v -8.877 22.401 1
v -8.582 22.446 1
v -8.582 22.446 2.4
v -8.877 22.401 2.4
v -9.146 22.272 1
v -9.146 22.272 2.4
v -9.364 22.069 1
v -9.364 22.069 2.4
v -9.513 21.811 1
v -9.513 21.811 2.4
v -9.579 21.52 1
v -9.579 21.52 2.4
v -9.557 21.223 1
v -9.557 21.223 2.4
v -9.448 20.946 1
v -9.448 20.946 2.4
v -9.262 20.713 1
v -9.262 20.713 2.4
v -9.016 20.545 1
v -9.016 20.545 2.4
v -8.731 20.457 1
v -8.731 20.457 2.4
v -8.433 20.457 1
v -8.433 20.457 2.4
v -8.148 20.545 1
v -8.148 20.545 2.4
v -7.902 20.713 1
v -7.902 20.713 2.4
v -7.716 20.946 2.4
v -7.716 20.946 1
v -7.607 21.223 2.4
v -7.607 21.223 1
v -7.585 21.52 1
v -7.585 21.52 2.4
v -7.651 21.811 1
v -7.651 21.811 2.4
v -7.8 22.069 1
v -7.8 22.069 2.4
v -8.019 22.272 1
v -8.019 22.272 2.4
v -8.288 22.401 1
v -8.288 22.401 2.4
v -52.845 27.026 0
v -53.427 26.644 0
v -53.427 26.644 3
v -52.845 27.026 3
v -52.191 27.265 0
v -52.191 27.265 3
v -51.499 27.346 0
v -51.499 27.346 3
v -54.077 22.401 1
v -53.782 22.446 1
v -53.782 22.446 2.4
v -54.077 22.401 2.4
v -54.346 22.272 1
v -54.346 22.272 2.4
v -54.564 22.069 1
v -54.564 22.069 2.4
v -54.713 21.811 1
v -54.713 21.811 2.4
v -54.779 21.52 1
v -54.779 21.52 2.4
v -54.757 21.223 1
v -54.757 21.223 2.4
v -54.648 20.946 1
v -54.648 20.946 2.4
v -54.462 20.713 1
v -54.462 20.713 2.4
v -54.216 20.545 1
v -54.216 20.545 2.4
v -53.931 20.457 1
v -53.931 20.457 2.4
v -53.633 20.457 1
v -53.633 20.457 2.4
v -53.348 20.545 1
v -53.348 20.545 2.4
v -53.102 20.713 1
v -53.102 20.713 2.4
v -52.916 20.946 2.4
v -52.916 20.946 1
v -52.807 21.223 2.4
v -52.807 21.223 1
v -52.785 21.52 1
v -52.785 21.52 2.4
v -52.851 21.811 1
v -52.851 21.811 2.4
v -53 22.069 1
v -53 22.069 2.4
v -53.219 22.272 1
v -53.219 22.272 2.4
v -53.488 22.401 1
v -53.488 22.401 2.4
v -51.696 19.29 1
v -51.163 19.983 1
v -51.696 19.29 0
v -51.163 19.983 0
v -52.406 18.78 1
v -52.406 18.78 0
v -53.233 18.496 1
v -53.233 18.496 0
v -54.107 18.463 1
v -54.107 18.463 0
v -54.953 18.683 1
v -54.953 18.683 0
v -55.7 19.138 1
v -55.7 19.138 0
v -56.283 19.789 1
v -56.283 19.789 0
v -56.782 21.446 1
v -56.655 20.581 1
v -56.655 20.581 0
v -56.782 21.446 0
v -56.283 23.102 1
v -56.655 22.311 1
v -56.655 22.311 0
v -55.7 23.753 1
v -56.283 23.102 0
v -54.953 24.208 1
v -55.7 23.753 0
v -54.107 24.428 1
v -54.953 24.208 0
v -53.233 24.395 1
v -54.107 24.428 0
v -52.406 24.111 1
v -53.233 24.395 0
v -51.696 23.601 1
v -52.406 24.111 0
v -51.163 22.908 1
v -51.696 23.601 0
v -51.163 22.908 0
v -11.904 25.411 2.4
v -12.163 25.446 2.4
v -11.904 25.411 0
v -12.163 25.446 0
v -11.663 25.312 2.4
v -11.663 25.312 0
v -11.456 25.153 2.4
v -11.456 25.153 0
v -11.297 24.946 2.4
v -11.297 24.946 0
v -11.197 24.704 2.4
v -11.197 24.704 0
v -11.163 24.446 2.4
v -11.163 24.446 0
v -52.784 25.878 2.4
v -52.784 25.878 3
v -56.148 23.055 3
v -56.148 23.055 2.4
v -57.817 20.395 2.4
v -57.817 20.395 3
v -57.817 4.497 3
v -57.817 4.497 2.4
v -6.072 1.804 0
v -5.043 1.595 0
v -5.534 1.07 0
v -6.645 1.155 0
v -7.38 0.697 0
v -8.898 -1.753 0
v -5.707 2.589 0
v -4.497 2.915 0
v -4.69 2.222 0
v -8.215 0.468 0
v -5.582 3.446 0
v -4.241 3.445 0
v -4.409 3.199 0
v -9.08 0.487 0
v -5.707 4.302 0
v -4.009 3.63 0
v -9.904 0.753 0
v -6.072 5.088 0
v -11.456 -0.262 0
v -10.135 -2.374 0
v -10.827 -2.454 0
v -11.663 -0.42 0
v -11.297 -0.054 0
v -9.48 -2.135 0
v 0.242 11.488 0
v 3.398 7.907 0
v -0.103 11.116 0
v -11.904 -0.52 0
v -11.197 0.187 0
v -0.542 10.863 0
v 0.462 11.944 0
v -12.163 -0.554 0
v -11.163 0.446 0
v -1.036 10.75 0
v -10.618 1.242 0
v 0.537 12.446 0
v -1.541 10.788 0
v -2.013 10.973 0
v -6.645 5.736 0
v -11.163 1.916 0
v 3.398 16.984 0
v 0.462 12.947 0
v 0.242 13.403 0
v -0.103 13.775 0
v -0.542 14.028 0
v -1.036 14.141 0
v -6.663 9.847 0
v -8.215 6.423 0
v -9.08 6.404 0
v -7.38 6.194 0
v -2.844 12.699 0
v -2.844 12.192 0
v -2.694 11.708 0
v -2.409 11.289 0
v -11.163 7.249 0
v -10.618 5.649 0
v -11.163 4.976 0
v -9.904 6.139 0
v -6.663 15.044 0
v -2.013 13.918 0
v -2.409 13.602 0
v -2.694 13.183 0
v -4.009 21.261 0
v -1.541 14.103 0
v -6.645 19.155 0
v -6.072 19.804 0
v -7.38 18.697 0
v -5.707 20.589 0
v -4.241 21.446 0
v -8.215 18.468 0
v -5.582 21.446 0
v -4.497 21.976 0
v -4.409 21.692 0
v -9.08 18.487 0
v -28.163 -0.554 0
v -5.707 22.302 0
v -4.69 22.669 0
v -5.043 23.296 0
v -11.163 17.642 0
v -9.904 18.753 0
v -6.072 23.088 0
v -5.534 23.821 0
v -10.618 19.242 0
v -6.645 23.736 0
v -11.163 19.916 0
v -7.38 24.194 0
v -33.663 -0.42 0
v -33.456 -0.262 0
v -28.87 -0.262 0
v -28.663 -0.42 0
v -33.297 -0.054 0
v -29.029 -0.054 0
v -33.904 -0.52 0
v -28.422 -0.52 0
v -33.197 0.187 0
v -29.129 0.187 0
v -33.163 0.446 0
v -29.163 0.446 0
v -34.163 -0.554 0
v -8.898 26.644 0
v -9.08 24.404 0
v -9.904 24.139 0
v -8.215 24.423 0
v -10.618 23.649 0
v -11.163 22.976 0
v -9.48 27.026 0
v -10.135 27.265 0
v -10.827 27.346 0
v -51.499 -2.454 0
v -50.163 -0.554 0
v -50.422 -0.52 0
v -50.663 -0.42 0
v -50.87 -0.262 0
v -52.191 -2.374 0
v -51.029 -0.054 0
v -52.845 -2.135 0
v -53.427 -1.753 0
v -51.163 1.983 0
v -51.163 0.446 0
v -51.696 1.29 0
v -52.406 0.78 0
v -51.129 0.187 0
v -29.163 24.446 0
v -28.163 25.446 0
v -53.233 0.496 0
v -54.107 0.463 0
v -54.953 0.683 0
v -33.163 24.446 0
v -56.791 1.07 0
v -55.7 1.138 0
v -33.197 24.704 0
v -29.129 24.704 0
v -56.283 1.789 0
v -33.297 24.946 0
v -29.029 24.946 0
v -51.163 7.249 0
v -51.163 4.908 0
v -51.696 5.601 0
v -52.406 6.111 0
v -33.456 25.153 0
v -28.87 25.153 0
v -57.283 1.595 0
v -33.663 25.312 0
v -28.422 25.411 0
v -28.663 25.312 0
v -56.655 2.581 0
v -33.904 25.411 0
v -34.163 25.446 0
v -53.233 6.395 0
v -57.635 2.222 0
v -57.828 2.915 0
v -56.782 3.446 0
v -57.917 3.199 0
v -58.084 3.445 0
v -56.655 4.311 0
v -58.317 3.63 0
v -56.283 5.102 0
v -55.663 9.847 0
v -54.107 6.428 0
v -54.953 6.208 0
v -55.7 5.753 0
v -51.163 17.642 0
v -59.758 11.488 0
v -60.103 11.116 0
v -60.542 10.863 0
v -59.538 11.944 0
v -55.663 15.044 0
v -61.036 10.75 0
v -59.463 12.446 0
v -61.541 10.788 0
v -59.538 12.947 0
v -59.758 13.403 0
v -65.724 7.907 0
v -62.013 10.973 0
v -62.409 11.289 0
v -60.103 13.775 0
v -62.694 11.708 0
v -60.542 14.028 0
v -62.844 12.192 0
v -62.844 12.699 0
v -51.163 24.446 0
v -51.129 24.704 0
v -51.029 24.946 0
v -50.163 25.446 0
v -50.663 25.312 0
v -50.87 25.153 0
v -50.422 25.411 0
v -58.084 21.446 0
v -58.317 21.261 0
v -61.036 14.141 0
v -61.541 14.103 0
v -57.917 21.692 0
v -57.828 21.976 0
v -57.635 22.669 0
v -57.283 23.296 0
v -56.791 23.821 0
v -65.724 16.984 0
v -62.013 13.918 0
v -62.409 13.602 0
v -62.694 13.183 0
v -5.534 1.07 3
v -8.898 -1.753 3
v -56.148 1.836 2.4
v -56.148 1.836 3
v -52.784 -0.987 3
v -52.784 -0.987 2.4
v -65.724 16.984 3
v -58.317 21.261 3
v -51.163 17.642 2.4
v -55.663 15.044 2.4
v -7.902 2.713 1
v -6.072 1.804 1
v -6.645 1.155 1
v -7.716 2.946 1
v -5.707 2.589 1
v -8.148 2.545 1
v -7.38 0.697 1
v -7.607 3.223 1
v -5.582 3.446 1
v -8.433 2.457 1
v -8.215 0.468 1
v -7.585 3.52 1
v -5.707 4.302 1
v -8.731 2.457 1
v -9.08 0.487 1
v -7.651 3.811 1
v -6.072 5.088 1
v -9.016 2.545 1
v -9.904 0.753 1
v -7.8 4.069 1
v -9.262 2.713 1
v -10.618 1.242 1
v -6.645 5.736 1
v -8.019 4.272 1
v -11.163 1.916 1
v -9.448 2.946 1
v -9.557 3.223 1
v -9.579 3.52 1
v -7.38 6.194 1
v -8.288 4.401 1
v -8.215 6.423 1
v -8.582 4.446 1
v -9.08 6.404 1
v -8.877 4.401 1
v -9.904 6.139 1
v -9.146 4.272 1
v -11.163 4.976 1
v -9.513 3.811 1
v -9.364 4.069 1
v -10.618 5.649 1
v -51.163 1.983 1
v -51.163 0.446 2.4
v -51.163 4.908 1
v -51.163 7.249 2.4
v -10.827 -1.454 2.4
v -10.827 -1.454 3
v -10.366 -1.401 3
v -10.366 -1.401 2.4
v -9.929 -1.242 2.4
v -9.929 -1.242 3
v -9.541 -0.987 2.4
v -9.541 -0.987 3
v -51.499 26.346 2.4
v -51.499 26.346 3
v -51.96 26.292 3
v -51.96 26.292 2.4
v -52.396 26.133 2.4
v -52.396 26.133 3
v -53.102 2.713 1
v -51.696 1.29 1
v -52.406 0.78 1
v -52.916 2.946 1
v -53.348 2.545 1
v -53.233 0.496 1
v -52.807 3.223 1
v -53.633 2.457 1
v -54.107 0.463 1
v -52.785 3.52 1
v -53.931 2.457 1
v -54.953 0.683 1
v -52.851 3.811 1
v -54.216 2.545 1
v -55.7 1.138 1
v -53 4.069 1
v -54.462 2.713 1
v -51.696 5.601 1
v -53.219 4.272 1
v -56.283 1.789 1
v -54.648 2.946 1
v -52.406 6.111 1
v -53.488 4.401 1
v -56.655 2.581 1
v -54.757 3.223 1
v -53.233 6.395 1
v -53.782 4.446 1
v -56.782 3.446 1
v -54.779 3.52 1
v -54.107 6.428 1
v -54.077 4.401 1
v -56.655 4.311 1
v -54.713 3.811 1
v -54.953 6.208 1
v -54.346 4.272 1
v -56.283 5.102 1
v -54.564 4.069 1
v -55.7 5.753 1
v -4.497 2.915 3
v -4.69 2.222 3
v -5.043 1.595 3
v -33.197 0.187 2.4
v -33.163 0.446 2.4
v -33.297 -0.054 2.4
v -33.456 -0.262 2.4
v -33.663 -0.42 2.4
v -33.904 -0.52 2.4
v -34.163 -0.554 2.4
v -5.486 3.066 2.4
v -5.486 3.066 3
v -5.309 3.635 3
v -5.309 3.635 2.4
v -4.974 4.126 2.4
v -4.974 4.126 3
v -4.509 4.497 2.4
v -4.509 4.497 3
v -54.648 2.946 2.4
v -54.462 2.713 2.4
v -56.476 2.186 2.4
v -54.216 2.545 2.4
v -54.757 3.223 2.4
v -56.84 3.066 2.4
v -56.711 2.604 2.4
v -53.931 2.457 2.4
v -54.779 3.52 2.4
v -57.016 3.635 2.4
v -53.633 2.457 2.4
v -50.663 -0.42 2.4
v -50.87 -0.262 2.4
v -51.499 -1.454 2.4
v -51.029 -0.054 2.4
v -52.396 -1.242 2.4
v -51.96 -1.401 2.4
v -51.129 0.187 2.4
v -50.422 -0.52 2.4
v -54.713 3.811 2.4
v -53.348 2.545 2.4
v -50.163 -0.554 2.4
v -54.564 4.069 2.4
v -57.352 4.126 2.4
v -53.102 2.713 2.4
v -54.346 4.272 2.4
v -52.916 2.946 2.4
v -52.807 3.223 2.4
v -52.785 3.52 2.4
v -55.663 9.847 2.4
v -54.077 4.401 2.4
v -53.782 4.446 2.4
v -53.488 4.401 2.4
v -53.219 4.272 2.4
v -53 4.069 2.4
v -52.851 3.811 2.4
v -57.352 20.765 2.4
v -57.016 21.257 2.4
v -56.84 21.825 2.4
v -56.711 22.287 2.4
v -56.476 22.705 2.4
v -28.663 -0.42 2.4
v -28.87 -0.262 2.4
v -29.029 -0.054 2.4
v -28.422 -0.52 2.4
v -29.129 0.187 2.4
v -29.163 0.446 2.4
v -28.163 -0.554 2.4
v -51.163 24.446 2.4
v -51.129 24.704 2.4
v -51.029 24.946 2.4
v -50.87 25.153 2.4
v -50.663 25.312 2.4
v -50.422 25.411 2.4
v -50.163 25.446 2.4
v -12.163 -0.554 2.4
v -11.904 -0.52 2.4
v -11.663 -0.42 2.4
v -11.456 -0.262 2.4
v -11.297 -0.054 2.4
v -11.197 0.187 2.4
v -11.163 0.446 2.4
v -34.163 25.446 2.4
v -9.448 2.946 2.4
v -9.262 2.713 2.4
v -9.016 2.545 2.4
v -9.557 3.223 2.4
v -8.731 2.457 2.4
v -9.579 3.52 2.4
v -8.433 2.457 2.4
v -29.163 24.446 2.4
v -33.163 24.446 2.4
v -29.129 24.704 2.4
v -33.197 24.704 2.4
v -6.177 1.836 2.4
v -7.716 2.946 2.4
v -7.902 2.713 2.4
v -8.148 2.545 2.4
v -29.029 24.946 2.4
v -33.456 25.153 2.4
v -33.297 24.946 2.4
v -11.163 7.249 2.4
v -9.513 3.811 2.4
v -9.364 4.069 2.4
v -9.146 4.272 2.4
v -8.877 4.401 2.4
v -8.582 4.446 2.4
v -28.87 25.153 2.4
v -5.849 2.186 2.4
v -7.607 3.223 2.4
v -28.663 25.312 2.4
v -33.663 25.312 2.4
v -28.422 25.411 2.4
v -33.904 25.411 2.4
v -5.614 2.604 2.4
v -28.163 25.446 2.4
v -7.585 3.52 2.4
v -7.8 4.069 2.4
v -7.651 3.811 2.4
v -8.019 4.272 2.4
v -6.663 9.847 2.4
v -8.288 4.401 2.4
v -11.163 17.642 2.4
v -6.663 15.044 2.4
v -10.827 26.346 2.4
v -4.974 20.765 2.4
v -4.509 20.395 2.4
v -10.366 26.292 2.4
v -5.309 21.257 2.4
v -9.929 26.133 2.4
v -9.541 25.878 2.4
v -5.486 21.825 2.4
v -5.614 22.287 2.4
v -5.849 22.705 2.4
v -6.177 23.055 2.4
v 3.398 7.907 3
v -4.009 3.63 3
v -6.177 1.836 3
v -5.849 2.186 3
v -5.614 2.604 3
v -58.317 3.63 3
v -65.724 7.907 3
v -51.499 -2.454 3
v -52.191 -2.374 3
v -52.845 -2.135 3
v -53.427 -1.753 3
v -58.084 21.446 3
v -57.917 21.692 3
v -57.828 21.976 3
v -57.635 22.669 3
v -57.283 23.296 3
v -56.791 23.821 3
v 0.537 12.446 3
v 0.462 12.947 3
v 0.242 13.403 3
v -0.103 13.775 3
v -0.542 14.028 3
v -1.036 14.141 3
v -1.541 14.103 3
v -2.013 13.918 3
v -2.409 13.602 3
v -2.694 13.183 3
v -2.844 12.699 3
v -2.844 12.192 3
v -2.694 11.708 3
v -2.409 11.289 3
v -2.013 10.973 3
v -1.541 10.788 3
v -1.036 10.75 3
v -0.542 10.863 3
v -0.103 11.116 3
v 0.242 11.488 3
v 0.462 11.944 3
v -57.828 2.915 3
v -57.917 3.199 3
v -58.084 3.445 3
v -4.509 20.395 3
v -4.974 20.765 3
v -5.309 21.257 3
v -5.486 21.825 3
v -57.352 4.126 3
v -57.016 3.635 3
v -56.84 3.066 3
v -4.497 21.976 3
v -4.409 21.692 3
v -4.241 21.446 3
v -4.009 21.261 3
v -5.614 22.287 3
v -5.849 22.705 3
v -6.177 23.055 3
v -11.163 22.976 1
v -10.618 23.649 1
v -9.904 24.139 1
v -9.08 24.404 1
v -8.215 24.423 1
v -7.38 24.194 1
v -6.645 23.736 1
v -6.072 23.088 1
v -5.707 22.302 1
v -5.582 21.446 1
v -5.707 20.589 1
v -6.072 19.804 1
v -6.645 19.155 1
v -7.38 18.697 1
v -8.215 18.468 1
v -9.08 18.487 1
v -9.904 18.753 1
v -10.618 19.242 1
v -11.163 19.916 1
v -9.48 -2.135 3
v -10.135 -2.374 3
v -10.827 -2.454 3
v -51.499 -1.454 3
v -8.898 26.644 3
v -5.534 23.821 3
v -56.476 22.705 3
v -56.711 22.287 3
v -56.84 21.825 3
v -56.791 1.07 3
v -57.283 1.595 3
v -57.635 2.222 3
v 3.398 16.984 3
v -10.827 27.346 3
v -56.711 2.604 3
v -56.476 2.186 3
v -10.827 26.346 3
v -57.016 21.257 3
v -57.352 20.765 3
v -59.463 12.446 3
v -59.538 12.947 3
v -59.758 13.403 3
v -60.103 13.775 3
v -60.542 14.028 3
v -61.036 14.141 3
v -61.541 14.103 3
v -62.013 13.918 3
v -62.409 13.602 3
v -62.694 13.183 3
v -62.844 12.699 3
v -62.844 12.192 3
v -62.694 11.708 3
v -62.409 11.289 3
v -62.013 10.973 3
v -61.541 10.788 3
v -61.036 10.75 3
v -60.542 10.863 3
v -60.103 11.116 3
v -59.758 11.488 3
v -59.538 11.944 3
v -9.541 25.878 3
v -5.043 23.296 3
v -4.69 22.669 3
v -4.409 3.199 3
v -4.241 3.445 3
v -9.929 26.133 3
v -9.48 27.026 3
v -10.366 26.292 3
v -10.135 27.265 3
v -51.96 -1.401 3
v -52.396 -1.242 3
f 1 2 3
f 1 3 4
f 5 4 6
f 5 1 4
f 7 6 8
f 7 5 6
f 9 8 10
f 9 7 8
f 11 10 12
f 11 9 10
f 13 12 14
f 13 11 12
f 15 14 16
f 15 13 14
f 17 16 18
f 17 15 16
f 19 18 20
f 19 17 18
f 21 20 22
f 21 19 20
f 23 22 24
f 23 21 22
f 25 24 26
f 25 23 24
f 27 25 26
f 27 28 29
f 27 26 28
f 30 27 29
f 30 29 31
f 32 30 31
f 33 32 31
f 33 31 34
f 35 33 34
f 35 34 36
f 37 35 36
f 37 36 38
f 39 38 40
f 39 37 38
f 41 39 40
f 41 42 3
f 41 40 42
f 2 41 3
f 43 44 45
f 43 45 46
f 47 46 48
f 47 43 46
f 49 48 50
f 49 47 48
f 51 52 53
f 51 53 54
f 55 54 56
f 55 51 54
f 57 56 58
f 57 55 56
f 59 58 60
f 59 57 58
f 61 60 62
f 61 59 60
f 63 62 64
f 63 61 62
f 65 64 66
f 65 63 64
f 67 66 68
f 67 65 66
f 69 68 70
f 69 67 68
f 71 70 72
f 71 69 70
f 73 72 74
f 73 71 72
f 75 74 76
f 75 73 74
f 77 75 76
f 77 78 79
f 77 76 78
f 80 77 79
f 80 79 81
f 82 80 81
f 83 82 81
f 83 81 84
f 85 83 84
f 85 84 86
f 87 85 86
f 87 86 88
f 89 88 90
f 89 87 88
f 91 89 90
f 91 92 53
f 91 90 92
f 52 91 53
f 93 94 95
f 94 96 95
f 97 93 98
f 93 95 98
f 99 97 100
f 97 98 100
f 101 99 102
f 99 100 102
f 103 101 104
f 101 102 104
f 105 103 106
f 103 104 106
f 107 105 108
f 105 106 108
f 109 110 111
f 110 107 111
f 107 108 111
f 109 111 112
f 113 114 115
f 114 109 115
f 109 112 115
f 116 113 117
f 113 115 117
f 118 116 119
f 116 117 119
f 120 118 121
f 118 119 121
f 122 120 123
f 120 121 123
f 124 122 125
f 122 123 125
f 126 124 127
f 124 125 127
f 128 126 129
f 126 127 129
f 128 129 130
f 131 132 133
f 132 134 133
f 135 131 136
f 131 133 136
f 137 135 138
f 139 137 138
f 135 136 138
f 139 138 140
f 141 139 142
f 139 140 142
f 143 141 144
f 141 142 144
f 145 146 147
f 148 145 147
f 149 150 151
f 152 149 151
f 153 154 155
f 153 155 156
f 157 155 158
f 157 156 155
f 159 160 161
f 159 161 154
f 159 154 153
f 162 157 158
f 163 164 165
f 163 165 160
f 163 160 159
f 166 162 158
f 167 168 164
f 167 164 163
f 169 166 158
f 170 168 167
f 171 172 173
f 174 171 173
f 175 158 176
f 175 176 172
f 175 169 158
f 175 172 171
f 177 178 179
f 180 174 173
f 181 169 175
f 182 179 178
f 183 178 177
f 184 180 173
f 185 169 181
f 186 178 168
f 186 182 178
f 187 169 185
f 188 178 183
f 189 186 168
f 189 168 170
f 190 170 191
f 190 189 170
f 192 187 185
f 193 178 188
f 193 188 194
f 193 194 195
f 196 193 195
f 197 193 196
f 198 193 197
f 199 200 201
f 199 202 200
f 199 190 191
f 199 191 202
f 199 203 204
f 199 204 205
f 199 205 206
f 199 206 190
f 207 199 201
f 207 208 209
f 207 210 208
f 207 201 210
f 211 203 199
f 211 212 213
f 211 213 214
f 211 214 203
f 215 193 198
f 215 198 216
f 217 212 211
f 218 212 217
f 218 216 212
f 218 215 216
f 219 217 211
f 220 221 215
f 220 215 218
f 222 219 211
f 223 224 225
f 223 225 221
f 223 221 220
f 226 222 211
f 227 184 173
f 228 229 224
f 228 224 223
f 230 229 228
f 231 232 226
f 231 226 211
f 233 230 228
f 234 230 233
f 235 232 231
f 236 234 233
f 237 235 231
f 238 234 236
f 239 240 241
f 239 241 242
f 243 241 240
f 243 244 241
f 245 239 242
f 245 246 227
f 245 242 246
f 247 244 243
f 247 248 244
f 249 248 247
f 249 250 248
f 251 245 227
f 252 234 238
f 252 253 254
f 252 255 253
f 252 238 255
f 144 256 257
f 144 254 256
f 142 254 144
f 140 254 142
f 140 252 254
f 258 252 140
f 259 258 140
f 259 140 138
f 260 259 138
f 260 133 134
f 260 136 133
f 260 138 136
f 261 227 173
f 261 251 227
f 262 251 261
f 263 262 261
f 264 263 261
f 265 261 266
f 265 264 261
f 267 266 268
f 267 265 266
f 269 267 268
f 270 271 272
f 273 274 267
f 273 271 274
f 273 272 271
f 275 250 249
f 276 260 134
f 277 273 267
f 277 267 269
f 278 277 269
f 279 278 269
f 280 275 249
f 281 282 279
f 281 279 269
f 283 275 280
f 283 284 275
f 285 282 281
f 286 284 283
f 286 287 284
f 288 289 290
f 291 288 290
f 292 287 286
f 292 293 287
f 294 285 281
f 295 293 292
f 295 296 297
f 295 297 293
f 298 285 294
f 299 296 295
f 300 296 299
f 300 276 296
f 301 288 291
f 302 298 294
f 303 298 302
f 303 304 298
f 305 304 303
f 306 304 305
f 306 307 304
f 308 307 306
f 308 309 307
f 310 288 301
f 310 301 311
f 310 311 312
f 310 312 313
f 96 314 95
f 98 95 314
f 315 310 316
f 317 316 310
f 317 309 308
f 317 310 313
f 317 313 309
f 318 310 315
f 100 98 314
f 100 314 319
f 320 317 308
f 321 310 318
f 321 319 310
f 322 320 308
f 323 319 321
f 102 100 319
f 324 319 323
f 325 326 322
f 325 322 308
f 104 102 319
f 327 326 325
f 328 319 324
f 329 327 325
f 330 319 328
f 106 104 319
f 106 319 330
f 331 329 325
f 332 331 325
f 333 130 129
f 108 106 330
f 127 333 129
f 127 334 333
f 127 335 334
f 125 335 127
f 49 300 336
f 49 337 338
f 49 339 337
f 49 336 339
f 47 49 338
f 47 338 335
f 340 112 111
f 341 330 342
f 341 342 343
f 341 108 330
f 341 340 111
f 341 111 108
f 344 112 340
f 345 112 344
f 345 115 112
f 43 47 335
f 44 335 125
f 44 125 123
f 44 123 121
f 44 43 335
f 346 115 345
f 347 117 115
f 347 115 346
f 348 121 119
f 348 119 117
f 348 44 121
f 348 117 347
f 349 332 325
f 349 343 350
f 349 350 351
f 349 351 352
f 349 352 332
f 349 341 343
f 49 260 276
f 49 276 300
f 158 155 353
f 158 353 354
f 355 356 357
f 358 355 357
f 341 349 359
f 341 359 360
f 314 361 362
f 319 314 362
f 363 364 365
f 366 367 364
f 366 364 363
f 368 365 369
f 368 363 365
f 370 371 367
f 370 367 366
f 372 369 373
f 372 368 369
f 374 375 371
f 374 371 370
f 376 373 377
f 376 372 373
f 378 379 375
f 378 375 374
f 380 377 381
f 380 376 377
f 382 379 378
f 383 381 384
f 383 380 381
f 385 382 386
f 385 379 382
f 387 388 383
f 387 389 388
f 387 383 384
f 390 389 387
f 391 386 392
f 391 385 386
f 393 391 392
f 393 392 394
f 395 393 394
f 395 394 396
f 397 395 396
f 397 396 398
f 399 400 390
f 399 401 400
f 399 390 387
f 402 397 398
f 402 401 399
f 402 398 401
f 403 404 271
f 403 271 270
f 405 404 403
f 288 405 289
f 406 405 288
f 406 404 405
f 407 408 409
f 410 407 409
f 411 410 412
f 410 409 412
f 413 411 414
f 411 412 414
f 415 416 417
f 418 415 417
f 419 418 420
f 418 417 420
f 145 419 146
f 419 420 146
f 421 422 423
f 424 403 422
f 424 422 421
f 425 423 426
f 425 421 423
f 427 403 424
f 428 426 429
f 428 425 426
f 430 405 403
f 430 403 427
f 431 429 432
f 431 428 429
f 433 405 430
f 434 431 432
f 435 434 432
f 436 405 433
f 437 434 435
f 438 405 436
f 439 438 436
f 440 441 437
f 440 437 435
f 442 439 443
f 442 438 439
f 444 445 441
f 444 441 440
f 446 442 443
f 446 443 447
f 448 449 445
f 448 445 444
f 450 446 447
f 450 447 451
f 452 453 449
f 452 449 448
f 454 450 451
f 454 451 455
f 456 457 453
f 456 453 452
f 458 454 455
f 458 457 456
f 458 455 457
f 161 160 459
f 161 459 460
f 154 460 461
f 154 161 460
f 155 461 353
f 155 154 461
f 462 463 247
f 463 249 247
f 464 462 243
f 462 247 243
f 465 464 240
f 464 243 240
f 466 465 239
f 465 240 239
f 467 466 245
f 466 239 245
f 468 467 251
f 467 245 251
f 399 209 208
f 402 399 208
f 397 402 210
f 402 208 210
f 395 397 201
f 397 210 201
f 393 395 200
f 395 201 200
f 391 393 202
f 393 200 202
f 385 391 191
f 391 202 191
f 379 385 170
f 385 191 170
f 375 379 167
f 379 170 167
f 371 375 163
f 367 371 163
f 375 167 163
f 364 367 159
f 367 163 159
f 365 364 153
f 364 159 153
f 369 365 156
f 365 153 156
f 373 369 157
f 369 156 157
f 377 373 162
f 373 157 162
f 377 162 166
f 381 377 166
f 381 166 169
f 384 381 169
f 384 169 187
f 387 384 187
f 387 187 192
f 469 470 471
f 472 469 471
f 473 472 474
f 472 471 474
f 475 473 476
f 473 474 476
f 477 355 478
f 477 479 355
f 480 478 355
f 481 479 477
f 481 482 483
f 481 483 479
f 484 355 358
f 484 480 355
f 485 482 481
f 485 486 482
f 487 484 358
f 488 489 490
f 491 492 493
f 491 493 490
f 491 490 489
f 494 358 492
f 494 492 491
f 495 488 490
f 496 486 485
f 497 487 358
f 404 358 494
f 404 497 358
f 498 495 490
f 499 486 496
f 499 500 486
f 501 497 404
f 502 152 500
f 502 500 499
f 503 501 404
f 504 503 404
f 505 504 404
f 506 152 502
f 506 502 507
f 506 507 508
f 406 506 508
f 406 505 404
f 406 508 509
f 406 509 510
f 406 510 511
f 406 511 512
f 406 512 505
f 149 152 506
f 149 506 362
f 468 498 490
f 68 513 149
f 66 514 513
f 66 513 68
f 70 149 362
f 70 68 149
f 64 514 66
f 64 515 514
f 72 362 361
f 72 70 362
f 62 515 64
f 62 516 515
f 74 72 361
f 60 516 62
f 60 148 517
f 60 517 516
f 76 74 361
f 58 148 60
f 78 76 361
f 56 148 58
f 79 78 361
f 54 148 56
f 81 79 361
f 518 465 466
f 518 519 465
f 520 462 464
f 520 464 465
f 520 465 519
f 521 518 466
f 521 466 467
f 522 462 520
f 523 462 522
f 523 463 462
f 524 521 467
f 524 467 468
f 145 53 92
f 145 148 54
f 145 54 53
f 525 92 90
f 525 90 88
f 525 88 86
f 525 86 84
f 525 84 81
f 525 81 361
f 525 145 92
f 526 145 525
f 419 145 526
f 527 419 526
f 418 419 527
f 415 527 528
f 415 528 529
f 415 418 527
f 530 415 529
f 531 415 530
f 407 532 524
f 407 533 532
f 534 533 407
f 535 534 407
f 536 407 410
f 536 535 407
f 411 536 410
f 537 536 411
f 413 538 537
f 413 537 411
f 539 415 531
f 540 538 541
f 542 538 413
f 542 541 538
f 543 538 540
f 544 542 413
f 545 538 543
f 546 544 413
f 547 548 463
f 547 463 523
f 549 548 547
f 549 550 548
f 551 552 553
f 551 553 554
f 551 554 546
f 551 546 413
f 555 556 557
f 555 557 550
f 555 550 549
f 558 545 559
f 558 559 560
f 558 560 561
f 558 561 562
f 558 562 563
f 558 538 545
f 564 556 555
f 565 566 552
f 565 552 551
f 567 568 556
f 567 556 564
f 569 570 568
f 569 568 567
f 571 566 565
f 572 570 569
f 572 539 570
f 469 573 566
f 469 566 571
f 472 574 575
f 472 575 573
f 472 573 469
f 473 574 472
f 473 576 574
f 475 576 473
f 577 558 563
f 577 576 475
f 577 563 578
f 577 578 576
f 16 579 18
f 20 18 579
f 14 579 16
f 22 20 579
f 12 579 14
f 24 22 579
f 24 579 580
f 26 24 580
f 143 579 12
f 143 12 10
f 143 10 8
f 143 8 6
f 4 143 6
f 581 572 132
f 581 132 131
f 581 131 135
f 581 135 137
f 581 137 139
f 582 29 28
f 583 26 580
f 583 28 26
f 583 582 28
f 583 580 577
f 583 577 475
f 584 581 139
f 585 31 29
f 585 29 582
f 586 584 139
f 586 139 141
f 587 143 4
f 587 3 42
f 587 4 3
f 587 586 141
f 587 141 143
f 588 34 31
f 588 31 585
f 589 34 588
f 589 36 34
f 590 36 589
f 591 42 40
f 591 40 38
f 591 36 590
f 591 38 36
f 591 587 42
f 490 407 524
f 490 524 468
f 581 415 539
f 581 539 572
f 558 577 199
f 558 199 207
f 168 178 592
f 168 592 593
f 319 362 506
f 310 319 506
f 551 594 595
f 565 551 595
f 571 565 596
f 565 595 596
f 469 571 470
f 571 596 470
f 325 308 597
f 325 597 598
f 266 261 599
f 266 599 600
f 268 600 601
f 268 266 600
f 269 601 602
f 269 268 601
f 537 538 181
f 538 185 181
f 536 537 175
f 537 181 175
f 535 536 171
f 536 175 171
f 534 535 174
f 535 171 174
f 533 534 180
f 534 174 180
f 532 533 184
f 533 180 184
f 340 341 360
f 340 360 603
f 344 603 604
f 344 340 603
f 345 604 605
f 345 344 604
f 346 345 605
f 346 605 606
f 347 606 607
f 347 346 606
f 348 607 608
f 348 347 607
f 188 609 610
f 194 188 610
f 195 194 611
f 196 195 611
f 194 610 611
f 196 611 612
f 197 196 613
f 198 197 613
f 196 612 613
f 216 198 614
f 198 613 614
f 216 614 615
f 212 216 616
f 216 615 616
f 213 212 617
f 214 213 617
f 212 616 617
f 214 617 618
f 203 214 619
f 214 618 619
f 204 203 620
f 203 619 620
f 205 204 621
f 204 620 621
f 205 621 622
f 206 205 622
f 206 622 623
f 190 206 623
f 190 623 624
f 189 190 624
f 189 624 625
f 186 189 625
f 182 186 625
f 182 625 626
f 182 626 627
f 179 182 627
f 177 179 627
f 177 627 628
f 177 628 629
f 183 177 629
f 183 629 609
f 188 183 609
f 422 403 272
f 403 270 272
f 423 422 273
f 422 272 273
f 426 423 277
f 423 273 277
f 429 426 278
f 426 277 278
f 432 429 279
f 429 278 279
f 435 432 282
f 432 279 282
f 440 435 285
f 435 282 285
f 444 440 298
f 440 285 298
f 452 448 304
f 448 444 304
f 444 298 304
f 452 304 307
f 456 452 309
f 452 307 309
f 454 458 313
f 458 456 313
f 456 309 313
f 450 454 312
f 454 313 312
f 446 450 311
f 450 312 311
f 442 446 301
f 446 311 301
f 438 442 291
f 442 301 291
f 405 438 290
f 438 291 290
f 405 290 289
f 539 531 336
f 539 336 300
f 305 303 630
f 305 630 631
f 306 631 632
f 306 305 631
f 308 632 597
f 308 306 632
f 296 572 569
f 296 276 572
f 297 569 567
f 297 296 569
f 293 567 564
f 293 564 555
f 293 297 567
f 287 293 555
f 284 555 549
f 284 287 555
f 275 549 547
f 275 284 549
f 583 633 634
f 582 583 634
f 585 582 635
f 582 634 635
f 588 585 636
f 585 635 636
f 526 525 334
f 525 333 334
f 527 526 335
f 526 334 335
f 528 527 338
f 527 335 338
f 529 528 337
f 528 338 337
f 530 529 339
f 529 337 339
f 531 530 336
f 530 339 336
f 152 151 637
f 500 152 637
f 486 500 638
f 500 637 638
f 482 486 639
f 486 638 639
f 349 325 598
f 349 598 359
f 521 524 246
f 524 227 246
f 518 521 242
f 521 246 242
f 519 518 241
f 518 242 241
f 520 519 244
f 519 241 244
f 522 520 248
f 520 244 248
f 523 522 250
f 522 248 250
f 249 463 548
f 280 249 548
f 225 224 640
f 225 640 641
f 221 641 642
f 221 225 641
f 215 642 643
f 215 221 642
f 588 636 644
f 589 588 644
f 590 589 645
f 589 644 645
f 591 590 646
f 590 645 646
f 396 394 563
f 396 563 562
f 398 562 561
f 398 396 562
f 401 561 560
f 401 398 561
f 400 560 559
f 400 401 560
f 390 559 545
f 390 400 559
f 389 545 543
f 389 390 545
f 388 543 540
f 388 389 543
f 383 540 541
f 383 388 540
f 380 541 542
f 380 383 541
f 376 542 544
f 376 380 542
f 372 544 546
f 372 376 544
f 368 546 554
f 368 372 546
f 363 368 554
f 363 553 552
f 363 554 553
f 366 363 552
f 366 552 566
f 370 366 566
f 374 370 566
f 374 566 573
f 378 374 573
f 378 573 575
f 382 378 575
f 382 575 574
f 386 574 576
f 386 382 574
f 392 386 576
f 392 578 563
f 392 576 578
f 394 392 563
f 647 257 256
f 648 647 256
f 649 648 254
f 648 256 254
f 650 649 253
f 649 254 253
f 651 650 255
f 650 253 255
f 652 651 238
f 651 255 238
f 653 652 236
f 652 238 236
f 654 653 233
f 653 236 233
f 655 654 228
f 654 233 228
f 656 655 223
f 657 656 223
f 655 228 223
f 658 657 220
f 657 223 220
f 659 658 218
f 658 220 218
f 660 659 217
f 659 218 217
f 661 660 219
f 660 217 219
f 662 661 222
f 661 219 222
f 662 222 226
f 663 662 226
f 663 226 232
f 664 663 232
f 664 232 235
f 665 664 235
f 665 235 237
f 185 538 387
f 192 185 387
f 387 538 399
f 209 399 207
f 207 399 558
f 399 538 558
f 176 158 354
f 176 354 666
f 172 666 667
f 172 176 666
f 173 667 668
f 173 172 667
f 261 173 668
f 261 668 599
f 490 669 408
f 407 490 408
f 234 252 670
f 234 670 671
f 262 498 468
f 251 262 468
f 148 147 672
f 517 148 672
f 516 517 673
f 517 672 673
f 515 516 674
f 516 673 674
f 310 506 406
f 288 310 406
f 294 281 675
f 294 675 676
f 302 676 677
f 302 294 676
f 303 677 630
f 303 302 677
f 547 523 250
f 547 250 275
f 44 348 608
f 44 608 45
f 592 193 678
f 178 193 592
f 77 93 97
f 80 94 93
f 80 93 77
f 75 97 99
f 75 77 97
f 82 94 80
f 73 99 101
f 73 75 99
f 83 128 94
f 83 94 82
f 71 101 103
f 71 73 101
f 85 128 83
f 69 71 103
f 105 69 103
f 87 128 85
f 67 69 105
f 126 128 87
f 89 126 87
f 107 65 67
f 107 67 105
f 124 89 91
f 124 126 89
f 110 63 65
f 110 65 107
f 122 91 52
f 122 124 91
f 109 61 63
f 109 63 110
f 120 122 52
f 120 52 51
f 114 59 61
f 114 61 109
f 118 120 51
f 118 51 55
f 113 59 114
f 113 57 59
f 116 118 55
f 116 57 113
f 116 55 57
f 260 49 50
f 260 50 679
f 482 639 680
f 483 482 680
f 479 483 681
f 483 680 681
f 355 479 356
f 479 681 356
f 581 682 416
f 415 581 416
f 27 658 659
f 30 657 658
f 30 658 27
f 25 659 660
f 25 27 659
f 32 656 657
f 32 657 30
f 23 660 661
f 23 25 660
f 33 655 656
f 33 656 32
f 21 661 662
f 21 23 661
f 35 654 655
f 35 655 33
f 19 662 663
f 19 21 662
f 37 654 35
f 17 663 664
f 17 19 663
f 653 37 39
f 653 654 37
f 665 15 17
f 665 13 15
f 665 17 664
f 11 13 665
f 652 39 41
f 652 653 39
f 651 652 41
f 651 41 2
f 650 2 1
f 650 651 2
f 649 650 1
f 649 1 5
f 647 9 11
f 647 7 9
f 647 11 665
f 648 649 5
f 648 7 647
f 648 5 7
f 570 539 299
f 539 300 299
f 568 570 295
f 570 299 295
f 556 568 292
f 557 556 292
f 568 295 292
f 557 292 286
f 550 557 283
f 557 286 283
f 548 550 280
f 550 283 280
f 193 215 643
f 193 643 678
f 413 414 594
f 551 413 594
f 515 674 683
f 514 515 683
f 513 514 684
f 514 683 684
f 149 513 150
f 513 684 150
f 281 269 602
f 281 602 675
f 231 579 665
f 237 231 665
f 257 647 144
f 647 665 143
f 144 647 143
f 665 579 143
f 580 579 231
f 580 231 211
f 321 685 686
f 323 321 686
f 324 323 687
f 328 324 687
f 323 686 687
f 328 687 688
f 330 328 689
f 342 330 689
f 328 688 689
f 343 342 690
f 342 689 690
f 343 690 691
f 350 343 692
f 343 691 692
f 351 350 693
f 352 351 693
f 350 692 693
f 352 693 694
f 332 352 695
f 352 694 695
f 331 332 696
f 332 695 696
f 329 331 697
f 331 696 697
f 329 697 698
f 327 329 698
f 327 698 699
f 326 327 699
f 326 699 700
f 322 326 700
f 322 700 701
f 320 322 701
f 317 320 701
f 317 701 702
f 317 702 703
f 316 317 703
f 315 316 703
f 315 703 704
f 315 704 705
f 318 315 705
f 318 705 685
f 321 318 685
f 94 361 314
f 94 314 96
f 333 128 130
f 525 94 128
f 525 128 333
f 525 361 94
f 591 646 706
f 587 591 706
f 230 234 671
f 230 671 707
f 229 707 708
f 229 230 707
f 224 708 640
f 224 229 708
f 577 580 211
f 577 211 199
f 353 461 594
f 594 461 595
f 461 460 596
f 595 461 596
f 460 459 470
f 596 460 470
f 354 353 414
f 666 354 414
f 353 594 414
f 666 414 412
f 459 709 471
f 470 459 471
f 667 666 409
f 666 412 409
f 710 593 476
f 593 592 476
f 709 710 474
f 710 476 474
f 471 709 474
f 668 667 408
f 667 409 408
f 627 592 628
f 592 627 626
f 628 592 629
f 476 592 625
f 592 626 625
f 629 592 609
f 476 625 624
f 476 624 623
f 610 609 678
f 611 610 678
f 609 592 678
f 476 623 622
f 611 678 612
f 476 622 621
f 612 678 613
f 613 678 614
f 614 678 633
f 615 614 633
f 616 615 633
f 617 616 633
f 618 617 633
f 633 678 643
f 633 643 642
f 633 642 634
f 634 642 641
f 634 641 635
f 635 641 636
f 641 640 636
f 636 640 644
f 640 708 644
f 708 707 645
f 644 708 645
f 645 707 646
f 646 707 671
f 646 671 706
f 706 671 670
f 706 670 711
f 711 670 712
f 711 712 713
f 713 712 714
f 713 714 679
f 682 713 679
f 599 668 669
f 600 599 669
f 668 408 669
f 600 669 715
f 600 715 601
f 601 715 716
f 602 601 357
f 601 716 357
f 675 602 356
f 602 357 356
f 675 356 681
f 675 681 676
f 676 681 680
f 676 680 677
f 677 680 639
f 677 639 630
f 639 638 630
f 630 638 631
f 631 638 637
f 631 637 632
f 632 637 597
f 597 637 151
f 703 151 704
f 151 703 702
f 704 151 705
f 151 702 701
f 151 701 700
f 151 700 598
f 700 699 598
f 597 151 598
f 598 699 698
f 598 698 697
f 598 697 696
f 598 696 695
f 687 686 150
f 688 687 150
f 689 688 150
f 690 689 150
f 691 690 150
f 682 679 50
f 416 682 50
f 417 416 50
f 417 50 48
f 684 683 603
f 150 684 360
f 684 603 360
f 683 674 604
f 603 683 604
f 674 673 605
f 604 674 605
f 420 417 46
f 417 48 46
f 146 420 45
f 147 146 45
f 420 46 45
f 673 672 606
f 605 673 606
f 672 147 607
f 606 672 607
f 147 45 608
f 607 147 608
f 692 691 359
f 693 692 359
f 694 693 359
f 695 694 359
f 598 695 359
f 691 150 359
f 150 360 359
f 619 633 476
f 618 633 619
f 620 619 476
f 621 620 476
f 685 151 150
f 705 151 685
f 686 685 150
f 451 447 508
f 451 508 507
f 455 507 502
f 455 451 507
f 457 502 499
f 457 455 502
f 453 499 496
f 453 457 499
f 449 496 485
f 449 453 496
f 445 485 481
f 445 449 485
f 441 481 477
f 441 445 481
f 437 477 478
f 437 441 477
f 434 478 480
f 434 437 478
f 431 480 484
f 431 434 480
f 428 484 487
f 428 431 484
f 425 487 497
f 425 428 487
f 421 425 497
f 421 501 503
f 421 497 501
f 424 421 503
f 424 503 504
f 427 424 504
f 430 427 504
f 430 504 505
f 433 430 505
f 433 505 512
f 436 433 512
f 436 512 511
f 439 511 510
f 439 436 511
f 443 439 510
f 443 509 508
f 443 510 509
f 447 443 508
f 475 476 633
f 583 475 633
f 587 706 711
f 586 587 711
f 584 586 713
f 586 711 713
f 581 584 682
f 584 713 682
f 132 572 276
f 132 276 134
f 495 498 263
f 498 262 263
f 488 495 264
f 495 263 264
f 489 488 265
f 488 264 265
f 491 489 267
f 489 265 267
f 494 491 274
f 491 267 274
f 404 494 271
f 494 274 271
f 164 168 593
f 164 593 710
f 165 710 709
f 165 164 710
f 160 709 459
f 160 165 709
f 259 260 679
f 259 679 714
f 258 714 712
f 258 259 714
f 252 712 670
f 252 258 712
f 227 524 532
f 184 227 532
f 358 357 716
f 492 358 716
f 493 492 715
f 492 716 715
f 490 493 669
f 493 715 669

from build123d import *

# Parameters (mm, degrees)
EXTRUDE_2_DEPTH      = 3
CUT_EXTRUDE_1_DEPTH  = 0.6
SKETCH_6_W           = 18
SKETCH_6_H           = 26
CUT_EXTRUDE_4_DEPTH  = 3.4
FILLET_1_R           = 1
CUT_EXTRUDE_6_DEPTH  = 3.4
FILLET_2_R           = 1
SKETCH_22_R          = 1.7
CUT_EXTRUDE_18_DEPTH = 4
SKETCH_23_R          = 3
CUT_EXTRUDE_19_DEPTH = 1


with BuildPart() as part:
    # 草图1 → 凸台-拉伸2 (new body)
    with BuildSketch(Plane.XY):
        with BuildLine():
            ThreePointArc((-4.008613189, 3.630478791), (-4.334307099, 3.328571786), (-4.497154053, 2.91540689))
            ThreePointArc((-4.497154053, 2.91540689), (-4.847622487, 1.898244021), (-5.534413817, 1.070134068))
            Line((-5.534413817, 1.070134068), (-8.898384051, -1.752572115))
            ThreePointArc((-8.898384051, -1.752572115), (-9.80068645, -2.273516648), (-10.82674688, -2.454438786))
            Line((-10.82674688, -2.454438786), (-51.498806412, -2.454438786))
            ThreePointArc((-51.498806412, -2.454438786), (-52.524866842, -2.273516648), (-53.427169241, -1.752572115))
            Line((-53.427169241, -1.752572115), (-56.791139475, 1.070134068))
            ThreePointArc((-56.791139475, 1.070134068), (-57.477930804, 1.898244021), (-57.828399238, 2.91540689))
            ThreePointArc((-57.828399238, 2.91540689), (-57.991246193, 3.328571786), (-58.316940102, 3.630478791))
            Line((-58.316940102, 3.630478791), (-65.723943689, 7.906914306))
            Line((-65.723943689, 7.906914306), (-65.723943689, 16.984208123))
            Line((-65.723943689, 16.984208123), (-58.316940102, 21.260643637))
            ThreePointArc((-58.316940102, 21.260643637), (-57.991246193, 21.562550642), (-57.828399238, 21.975715539))
            ThreePointArc((-57.828399238, 21.975715539), (-57.477930804, 22.992878408), (-56.791139475, 23.820988361))
            Line((-56.791139475, 23.820988361), (-53.427169241, 26.643694544))
            ThreePointArc((-53.427169241, 26.643694544), (-52.524866842, 27.164639077), (-51.498806412, 27.345561214))
            Line((-51.498806412, 27.345561214), (-10.82674688, 27.345561214))
            ThreePointArc((-10.82674688, 27.345561214), (-9.80068645, 27.164639077), (-8.898384051, 26.643694544))
            Line((-8.898384051, 26.643694544), (-5.534413817, 23.820988361))
            ThreePointArc((-5.534413817, 23.820988361), (-4.847622487, 22.992878408), (-4.497154053, 21.975715539))
            ThreePointArc((-4.497154053, 21.975715539), (-4.334307099, 21.562550642), (-4.008613189, 21.260643637))
            Line((-4.008613189, 21.260643637), (3.398390397, 16.984208123))
            Line((3.398390397, 16.984208123), (3.398390397, 7.906914306))
            Line((3.398390397, 7.906914306), (-4.008613189, 3.630478791))
        make_face()
        with BuildLine():
            ThreePointArc((-51.498806412, 26.345561214), (-52.182846698, 26.224946456), (-52.784381631, 25.8776501))
            Line((-52.784381631, 25.8776501), (-56.148351865, 23.054943918))
            ThreePointArc((-56.148351865, 23.054943918), (-56.67539222, 22.368091555), (-56.862776646, 21.522855031))
            Line((-56.862776646, 21.522855031), (-56.862776646, 3.368267397))
            ThreePointArc((-56.862776646, 3.368267397), (-56.67539222, 2.523030874), (-56.148351865, 1.836178511))
            Line((-56.148351865, 1.836178511), (-52.784381631, -0.986527672))
            ThreePointArc((-52.784381631, -0.986527672), (-52.182846698, -1.333824027), (-51.498806412, -1.454438786))
            Line((-51.498806412, -1.454438786), (-10.82674688, -1.454438786))
            ThreePointArc((-10.82674688, -1.454438786), (-10.142706593, -1.333824027), (-9.541171661, -0.986527672))
            Line((-9.541171661, -0.986527672), (-6.177201426, 1.836178511))
            ThreePointArc((-6.177201426, 1.836178511), (-5.650161072, 2.523030874), (-5.462776646, 3.368267397))
            Line((-5.462776646, 3.368267397), (-5.462776646, 21.522855031))
            ThreePointArc((-5.462776646, 21.522855031), (-5.650161072, 22.368091555), (-6.177201426, 23.054943918))
            Line((-6.177201426, 23.054943918), (-9.541171661, 25.8776501))
            ThreePointArc((-9.541171661, 25.8776501), (-10.142706593, 26.224946456), (-10.82674688, 26.345561214))
            Line((-10.82674688, 26.345561214), (-51.498806412, 26.345561214))
        make_face(mode=Mode.SUBTRACT)
        with BuildLine():
            Line((-10.82674688, 26.345561214), (-51.498806412, 26.345561214))
            ThreePointArc((-51.498806412, 26.345561214), (-52.182846698, 26.224946456), (-52.784381631, 25.8776501))
            Line((-52.784381631, 25.8776501), (-56.148351865, 23.054943918))
            ThreePointArc((-56.148351865, 23.054943918), (-56.67539222, 22.368091555), (-56.862776646, 21.522855031))
            Line((-56.862776646, 21.522855031), (-56.862776646, 3.368267397))
            ThreePointArc((-56.862776646, 3.368267397), (-56.67539222, 2.523030874), (-56.148351865, 1.836178511))
            Line((-56.148351865, 1.836178511), (-52.784381631, -0.986527672))
            ThreePointArc((-52.784381631, -0.986527672), (-52.182846698, -1.333824027), (-51.498806412, -1.454438786))
            Line((-51.498806412, -1.454438786), (-10.82674688, -1.454438786))
            ThreePointArc((-10.82674688, -1.454438786), (-10.142706593, -1.333824027), (-9.541171661, -0.986527672))
            Line((-9.541171661, -0.986527672), (-6.177201426, 1.836178511))
            ThreePointArc((-6.177201426, 1.836178511), (-5.650161072, 2.523030874), (-5.462776646, 3.368267397))
            Line((-5.462776646, 3.368267397), (-5.462776646, 21.522855031))
            ThreePointArc((-5.462776646, 21.522855031), (-5.650161072, 22.368091555), (-6.177201426, 23.054943918))
            Line((-6.177201426, 23.054943918), (-9.541171661, 25.8776501))
            ThreePointArc((-9.541171661, 25.8776501), (-10.142706593, 26.224946456), (-10.82674688, 26.345561214))
        make_face()
        with BuildLine():
            ThreePointArc((-53.78228524, 2.445561214), (-52.78228524, 3.445561214), (-53.78228524, 4.445561214))
            ThreePointArc((-53.78228524, 4.445561214), (-54.78228524, 3.445561214), (-53.78228524, 2.445561214))
        make_face(mode=Mode.SUBTRACT)
        with BuildLine():
            ThreePointArc((-53.78228524, 20.445561214), (-52.78228524, 21.445561214), (-53.78228524, 22.445561214))
            ThreePointArc((-53.78228524, 22.445561214), (-54.78228524, 21.445561214), (-53.78228524, 20.445561214))
        make_face(mode=Mode.SUBTRACT)
        with BuildLine():
            ThreePointArc((-8.58228524, 2.445561214), (-7.58228524, 3.445561214), (-8.58228524, 4.445561214))
            ThreePointArc((-8.58228524, 4.445561214), (-9.58228524, 3.445561214), (-8.58228524, 2.445561214))
        make_face(mode=Mode.SUBTRACT)
        with BuildLine():
            ThreePointArc((-8.58228524, 20.445561214), (-7.58228524, 21.445561214), (-8.58228524, 22.445561214))
            ThreePointArc((-8.58228524, 22.445561214), (-9.58228524, 21.445561214), (-8.58228524, 20.445561214))
        make_face(mode=Mode.SUBTRACT)
    extrude(amount=EXTRUDE_2_DEPTH)

    # 草图4 → 切除-拉伸1 (cut)
    with BuildSketch(Plane.XY.offset(3)):
        with BuildLine():
            Line((-56.148351865, 1.836178511), (-52.784381631, -0.986527672))
            ThreePointArc((-52.784381631, -0.986527672), (-52.182846698, -1.333824027), (-51.498806412, -1.454438786))
            Line((-51.498806412, -1.454438786), (-10.82674688, -1.454438786))
            ThreePointArc((-10.82674688, -1.454438786), (-10.142706593, -1.333824027), (-9.541171661, -0.986527672))
            Line((-9.541171661, -0.986527672), (-6.177201426, 1.836178511))
            ThreePointArc((-6.177201426, 1.836178511), (-5.71934054, 2.388251813), (-5.485694918, 3.066360392))
            ThreePointArc((-5.485694918, 3.066360392), (-5.160001008, 3.892690185), (-4.508613189, 4.496504195))
            Line((-4.508613189, 4.496504195), (-4.508613189, 20.394618234))
            ThreePointArc((-4.508613189, 20.394618234), (-5.160001008, 20.998432243), (-5.485694918, 21.824762036))
            ThreePointArc((-5.485694918, 21.824762036), (-5.71934054, 22.502870615), (-6.177201426, 23.054943918))
            Line((-6.177201426, 23.054943918), (-9.541171661, 25.8776501))
            ThreePointArc((-9.541171661, 25.8776501), (-10.142706593, 26.224946456), (-10.82674688, 26.345561214))
            Line((-10.82674688, 26.345561214), (-51.498806412, 26.345561214))
            ThreePointArc((-51.498806412, 26.345561214), (-52.182846698, 26.224946456), (-52.784381631, 25.8776501))
            Line((-52.784381631, 25.8776501), (-56.148351865, 23.054943918))
            ThreePointArc((-56.148351865, 23.054943918), (-56.606212752, 22.502870615), (-56.839858374, 21.824762036))
            ThreePointArc((-56.839858374, 21.824762036), (-57.165552284, 20.998432243), (-57.816940102, 20.394618234))
            Line((-57.816940102, 20.394618234), (-57.816940102, 4.496504195))
            ThreePointArc((-57.816940102, 4.496504195), (-57.165552284, 3.892690185), (-56.839858374, 3.066360392))
            ThreePointArc((-56.839858374, 3.066360392), (-56.606212752, 2.388251813), (-56.148351865, 1.836178511))
        make_face()
    extrude(amount=-CUT_EXTRUDE_1_DEPTH, mode=Mode.SUBTRACT)

    # 草图6 → 切除-拉伸4 (cut, through all)
    with BuildSketch(Plane.XY.offset(2.4)):
        with Locations((-20.162776646, 12.445561214)):
            Rectangle(SKETCH_6_W, SKETCH_6_H)
        with Locations((-42.162776646, 12.445561214)):
            Rectangle(SKETCH_6_W, SKETCH_6_H)
    extrude(amount=-CUT_EXTRUDE_4_DEPTH, mode=Mode.SUBTRACT)

    # 圆角1
    fillet_1_edges = [part.edges().sort_by_distance(p)[0] for p in [
        (-29.162776646, -0.554438786, 1.2),
        (-29.162776646, 25.445561214, 1.2),
        (-33.162776646, 25.445561214, 1.2),
        (-33.162776646, -0.554438786, 1.2),
    ]]
    fillet(fillet_1_edges, radius=FILLET_1_R)

    # 草图10 → 切除-拉伸6 (cut, through all)
    with BuildSketch(Plane.XY.offset(2.4)):
        Polygon((-11.162776646, 7.249408791), (-11.162776646, 17.641713637), (-6.662776646, 15.043637426), (-6.662776646, 9.847485003), align=None)
        Polygon((-51.162776646, 7.249408791), (-51.162776646, 17.641713637), (-55.662776646, 15.043637426), (-55.662776646, 9.847485003), align=None)
    extrude(amount=-CUT_EXTRUDE_6_DEPTH, mode=Mode.SUBTRACT)

    # 圆角2
    fillet_2_edges = [part.edges().sort_by_distance(p)[0] for p in [
        (-11.162776646, 25.445561214, 1.2),
        (-11.162776646, -0.554438786, 1.2),
        (-51.162776646, -0.554438786, 1.2),
        (-51.162776646, 25.445561214, 1.2),
    ]]
    fillet(fillet_2_edges, radius=FILLET_2_R)

    # 草图22 → 切除-拉伸18 (cut, through all)
    with BuildSketch(Plane.XY.offset(3)):
        with Locations((-1.162776646, 12.445561214)):
            Circle(SKETCH_22_R)
        with Locations((-61.162776646, 12.445561214)):
            Circle(SKETCH_22_R)
    extrude(amount=-CUT_EXTRUDE_18_DEPTH, mode=Mode.SUBTRACT)

    # 草图23 → 切除-拉伸19 (cut)
    with BuildSketch(Plane(origin=(0, 0, 0), x_dir=(-1, 0, 0), z_dir=(0, 0, -1))):
        with Locations((53.78228524, 3.445561214)):
            Circle(SKETCH_23_R)
        with Locations((53.78228524, 21.445561214)):
            Circle(SKETCH_23_R)
        with Locations((8.58228524, 21.445561214)):
            Circle(SKETCH_23_R)
        with Locations((8.58228524, 3.445561214)):
            Circle(SKETCH_23_R)
    extrude(amount=-CUT_EXTRUDE_19_DEPTH, mode=Mode.SUBTRACT)


solid = part.part
